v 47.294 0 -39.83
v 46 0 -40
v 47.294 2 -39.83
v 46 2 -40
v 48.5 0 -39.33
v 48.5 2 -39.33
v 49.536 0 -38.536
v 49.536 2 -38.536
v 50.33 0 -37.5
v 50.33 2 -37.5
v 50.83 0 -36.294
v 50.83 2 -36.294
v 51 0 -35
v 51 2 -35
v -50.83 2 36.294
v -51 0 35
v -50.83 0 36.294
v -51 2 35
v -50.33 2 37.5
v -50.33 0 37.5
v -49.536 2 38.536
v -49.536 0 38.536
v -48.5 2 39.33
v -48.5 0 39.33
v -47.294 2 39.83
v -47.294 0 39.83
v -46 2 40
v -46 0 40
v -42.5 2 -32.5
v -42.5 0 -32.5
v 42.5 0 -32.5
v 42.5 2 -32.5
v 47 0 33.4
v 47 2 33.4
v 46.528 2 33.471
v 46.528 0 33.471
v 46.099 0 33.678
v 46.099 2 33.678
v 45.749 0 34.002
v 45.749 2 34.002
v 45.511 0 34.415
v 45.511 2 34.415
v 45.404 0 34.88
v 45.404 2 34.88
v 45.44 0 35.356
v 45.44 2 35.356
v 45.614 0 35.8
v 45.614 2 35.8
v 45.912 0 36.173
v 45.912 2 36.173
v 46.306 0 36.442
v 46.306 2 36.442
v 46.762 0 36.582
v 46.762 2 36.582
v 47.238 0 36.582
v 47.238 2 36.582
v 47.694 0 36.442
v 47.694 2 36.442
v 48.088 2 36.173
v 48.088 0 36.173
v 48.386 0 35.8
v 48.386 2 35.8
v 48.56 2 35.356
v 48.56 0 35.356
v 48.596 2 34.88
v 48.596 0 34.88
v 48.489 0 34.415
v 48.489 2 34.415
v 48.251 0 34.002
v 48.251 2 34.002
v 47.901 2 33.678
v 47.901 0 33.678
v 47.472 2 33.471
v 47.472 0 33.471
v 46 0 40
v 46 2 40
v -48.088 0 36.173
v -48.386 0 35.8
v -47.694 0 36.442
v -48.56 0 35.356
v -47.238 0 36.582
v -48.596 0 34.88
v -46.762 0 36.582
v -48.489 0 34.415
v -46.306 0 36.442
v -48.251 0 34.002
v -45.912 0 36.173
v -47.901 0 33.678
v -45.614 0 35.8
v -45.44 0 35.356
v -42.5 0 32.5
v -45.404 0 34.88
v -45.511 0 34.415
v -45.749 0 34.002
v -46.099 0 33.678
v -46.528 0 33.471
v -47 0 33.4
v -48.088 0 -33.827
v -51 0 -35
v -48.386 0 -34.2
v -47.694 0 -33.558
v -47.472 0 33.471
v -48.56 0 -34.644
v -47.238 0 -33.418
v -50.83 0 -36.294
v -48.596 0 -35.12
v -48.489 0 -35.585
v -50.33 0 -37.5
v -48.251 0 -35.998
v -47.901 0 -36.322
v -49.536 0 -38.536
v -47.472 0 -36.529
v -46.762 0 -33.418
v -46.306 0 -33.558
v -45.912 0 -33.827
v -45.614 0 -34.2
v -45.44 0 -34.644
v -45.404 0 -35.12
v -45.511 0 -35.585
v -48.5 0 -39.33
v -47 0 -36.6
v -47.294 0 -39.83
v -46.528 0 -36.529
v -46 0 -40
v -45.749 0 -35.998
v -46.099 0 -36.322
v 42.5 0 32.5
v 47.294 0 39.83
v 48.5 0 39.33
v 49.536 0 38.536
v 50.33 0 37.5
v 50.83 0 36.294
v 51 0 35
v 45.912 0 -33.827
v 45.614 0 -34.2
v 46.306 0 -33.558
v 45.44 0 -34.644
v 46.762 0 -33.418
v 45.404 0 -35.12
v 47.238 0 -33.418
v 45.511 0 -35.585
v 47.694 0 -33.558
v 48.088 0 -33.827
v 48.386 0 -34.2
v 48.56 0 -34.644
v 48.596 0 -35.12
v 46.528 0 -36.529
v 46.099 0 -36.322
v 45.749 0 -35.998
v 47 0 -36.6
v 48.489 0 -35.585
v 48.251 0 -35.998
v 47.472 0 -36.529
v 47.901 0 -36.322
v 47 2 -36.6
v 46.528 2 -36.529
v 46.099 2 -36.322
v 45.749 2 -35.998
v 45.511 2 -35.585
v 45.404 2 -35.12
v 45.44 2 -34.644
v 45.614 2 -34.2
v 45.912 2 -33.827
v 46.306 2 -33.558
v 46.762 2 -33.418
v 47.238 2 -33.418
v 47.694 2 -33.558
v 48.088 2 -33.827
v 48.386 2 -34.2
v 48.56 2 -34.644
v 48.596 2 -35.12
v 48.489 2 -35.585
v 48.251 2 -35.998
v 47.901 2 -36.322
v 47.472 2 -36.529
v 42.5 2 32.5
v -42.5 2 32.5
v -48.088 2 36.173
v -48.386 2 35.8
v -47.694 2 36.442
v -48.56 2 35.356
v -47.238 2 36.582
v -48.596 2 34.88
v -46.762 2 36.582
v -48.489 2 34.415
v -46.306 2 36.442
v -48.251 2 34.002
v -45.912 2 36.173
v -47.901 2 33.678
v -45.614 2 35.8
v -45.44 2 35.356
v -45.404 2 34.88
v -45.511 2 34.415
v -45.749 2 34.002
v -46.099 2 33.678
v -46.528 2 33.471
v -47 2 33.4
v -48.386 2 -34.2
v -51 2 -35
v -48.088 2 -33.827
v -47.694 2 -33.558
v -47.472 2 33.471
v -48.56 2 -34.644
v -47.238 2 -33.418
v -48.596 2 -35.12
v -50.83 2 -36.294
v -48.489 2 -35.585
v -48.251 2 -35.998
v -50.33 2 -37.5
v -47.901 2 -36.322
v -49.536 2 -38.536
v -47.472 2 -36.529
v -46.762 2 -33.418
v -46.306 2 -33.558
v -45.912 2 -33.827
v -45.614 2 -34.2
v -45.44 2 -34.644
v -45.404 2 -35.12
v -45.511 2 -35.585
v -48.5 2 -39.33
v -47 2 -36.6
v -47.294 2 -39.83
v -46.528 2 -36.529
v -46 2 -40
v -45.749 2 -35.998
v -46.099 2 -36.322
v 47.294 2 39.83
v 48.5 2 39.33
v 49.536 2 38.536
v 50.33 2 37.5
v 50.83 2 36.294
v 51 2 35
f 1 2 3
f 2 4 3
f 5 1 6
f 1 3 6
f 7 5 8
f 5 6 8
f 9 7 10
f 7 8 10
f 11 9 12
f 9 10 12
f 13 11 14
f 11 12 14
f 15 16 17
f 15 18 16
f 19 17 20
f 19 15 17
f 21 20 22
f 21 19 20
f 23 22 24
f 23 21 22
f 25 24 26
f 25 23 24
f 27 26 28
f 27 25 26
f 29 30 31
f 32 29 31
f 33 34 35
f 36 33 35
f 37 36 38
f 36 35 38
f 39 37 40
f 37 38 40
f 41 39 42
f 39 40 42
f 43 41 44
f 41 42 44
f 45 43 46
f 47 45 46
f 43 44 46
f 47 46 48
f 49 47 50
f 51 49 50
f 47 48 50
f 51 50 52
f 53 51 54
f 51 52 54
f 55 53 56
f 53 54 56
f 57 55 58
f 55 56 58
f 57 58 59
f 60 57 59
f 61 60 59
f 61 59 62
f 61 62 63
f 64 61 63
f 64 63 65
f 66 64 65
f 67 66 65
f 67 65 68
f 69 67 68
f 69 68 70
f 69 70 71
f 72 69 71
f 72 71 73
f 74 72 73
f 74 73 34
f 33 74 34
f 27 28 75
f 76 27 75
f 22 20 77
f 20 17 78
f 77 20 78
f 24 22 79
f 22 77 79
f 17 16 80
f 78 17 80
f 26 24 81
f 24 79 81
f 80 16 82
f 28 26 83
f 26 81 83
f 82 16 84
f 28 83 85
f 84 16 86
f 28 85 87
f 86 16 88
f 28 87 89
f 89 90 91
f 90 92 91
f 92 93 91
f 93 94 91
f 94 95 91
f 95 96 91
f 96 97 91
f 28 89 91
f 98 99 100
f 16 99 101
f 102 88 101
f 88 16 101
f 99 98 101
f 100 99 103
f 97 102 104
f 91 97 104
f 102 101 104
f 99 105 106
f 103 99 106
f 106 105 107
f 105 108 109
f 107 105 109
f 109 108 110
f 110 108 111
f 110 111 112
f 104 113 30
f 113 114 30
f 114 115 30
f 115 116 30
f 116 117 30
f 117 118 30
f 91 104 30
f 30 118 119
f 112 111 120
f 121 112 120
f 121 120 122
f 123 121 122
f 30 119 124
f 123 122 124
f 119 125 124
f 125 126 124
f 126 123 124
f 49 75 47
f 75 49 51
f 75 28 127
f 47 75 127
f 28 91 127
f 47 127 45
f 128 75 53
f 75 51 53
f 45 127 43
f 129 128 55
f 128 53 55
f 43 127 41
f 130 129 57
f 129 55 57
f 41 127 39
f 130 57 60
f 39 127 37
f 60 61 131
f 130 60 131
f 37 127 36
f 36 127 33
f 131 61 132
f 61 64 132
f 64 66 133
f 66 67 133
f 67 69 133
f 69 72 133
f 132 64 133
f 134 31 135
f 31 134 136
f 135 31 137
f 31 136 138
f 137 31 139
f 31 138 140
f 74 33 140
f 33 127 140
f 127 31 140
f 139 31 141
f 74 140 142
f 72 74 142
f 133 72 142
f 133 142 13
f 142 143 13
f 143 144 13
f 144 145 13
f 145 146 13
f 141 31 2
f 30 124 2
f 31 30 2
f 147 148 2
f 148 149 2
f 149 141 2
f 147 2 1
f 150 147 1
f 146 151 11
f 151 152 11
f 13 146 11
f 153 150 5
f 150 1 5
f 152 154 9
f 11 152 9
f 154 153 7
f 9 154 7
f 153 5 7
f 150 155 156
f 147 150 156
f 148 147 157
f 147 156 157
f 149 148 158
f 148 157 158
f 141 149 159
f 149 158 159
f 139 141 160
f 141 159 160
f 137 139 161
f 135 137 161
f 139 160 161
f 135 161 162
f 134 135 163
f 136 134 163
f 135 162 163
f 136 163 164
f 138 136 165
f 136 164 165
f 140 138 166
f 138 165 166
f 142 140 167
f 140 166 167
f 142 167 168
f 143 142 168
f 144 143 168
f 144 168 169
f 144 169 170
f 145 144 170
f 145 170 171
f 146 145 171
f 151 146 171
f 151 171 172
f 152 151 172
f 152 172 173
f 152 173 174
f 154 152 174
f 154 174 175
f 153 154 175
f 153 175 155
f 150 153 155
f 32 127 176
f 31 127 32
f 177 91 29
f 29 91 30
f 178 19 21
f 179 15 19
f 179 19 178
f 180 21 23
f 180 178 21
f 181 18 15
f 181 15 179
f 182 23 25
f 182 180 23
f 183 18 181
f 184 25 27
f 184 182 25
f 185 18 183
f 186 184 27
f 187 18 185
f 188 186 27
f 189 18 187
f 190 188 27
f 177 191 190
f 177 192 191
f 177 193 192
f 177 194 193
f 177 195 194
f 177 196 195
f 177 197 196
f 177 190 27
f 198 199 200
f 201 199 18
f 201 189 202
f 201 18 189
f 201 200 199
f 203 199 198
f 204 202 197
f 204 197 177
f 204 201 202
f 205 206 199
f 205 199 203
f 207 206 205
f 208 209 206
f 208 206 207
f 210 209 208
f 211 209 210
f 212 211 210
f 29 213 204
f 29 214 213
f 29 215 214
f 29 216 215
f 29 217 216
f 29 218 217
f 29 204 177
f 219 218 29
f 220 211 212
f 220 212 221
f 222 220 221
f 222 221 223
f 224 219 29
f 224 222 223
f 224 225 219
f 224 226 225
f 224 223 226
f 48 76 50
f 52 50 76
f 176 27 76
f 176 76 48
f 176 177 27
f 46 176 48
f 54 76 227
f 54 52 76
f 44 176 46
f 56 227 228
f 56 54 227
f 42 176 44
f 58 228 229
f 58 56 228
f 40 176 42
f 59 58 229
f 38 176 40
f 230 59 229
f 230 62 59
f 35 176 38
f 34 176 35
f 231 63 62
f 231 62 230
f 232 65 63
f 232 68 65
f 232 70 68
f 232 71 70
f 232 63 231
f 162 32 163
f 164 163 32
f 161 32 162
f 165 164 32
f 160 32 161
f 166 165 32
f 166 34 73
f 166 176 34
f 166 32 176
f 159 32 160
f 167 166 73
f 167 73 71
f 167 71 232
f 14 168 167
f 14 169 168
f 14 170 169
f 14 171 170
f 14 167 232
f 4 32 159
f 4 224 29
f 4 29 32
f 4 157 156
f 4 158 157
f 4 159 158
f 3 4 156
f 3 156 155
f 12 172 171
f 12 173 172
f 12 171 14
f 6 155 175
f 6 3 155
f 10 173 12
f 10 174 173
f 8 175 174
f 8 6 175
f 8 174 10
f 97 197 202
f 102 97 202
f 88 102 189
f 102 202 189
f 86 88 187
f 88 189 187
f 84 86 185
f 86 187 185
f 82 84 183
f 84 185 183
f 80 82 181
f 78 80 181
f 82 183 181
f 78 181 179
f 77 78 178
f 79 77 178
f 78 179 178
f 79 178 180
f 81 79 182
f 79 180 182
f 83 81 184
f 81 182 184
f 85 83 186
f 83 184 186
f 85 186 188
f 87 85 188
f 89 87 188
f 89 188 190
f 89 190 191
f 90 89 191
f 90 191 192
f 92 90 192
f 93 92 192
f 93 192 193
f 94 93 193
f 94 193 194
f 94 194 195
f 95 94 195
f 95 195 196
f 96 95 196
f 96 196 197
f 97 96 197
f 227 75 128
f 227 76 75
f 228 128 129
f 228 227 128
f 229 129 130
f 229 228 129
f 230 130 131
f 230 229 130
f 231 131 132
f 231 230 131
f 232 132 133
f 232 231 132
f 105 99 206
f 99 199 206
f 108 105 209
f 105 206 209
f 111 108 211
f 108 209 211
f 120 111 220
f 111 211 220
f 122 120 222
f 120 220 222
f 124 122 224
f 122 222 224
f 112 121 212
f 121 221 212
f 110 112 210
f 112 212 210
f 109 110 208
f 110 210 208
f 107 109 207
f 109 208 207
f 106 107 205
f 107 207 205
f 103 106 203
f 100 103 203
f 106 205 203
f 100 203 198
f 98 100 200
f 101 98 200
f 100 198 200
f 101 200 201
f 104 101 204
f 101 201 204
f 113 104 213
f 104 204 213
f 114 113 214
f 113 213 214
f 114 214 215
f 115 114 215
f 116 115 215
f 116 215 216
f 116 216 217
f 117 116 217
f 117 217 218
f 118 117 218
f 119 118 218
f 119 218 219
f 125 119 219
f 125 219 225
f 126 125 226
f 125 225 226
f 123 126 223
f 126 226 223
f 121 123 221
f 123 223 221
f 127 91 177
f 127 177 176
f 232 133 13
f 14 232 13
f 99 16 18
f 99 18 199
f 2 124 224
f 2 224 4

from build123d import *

# Parameters (mm, degrees)
SKETCH1_W           = 102
SKETCH1_H           = 80
SKETCH1_W_2         = 85
SKETCH1_H_2         = 65
BOSS_EXTRUDE1_DEPTH = 2
FILLET2_R           = 5
SKETCH2_R           = 1.6
CUT_EXTRUDE1_DEPTH  = 64.5


with BuildPart() as part:
    # Sketch1 → Boss-Extrude1 (new body)
    with BuildSketch(Plane(origin=(0, 0, 0), x_dir=(1, 0, 0), z_dir=(0, 1, 0))):
        Rectangle(SKETCH1_W, SKETCH1_H)
        Rectangle(SKETCH1_W_2, SKETCH1_H_2, mode=Mode.SUBTRACT)
    extrude(amount=BOSS_EXTRUDE1_DEPTH)

    # Fillet2
    fillet2_edges = [part.edges().sort_by_distance(p)[0] for p in [
        (-51, 1, 40),
        (-51, 1, -40),
        (51, 1, -40),
        (51, 1, 40),
    ]]
    fillet(fillet2_edges, radius=FILLET2_R)

    # Sketch2 → Cut-Extrude1 (cut, symmetric)
    with BuildSketch(Plane(origin=(0, 2, 0), x_dir=(1, 0, 0), z_dir=(0, 1, 0))):
        with Locations(Location((-47, -35, 0), (0, 0, 90))):
            Circle(SKETCH2_R)
        with Locations(Location((47, -35, 0), (0, 0, 90))):
            Circle(SKETCH2_R)
        with Locations(Location((47, 35, 0), (0, 0, 90))):
            Circle(SKETCH2_R)
        with Locations(Location((-47, 35, 0), (0, 0, 90))):
            Circle(SKETCH2_R)
    extrude(amount=CUT_EXTRUDE1_DEPTH, both=True, mode=Mode.SUBTRACT)


solid = part.part
